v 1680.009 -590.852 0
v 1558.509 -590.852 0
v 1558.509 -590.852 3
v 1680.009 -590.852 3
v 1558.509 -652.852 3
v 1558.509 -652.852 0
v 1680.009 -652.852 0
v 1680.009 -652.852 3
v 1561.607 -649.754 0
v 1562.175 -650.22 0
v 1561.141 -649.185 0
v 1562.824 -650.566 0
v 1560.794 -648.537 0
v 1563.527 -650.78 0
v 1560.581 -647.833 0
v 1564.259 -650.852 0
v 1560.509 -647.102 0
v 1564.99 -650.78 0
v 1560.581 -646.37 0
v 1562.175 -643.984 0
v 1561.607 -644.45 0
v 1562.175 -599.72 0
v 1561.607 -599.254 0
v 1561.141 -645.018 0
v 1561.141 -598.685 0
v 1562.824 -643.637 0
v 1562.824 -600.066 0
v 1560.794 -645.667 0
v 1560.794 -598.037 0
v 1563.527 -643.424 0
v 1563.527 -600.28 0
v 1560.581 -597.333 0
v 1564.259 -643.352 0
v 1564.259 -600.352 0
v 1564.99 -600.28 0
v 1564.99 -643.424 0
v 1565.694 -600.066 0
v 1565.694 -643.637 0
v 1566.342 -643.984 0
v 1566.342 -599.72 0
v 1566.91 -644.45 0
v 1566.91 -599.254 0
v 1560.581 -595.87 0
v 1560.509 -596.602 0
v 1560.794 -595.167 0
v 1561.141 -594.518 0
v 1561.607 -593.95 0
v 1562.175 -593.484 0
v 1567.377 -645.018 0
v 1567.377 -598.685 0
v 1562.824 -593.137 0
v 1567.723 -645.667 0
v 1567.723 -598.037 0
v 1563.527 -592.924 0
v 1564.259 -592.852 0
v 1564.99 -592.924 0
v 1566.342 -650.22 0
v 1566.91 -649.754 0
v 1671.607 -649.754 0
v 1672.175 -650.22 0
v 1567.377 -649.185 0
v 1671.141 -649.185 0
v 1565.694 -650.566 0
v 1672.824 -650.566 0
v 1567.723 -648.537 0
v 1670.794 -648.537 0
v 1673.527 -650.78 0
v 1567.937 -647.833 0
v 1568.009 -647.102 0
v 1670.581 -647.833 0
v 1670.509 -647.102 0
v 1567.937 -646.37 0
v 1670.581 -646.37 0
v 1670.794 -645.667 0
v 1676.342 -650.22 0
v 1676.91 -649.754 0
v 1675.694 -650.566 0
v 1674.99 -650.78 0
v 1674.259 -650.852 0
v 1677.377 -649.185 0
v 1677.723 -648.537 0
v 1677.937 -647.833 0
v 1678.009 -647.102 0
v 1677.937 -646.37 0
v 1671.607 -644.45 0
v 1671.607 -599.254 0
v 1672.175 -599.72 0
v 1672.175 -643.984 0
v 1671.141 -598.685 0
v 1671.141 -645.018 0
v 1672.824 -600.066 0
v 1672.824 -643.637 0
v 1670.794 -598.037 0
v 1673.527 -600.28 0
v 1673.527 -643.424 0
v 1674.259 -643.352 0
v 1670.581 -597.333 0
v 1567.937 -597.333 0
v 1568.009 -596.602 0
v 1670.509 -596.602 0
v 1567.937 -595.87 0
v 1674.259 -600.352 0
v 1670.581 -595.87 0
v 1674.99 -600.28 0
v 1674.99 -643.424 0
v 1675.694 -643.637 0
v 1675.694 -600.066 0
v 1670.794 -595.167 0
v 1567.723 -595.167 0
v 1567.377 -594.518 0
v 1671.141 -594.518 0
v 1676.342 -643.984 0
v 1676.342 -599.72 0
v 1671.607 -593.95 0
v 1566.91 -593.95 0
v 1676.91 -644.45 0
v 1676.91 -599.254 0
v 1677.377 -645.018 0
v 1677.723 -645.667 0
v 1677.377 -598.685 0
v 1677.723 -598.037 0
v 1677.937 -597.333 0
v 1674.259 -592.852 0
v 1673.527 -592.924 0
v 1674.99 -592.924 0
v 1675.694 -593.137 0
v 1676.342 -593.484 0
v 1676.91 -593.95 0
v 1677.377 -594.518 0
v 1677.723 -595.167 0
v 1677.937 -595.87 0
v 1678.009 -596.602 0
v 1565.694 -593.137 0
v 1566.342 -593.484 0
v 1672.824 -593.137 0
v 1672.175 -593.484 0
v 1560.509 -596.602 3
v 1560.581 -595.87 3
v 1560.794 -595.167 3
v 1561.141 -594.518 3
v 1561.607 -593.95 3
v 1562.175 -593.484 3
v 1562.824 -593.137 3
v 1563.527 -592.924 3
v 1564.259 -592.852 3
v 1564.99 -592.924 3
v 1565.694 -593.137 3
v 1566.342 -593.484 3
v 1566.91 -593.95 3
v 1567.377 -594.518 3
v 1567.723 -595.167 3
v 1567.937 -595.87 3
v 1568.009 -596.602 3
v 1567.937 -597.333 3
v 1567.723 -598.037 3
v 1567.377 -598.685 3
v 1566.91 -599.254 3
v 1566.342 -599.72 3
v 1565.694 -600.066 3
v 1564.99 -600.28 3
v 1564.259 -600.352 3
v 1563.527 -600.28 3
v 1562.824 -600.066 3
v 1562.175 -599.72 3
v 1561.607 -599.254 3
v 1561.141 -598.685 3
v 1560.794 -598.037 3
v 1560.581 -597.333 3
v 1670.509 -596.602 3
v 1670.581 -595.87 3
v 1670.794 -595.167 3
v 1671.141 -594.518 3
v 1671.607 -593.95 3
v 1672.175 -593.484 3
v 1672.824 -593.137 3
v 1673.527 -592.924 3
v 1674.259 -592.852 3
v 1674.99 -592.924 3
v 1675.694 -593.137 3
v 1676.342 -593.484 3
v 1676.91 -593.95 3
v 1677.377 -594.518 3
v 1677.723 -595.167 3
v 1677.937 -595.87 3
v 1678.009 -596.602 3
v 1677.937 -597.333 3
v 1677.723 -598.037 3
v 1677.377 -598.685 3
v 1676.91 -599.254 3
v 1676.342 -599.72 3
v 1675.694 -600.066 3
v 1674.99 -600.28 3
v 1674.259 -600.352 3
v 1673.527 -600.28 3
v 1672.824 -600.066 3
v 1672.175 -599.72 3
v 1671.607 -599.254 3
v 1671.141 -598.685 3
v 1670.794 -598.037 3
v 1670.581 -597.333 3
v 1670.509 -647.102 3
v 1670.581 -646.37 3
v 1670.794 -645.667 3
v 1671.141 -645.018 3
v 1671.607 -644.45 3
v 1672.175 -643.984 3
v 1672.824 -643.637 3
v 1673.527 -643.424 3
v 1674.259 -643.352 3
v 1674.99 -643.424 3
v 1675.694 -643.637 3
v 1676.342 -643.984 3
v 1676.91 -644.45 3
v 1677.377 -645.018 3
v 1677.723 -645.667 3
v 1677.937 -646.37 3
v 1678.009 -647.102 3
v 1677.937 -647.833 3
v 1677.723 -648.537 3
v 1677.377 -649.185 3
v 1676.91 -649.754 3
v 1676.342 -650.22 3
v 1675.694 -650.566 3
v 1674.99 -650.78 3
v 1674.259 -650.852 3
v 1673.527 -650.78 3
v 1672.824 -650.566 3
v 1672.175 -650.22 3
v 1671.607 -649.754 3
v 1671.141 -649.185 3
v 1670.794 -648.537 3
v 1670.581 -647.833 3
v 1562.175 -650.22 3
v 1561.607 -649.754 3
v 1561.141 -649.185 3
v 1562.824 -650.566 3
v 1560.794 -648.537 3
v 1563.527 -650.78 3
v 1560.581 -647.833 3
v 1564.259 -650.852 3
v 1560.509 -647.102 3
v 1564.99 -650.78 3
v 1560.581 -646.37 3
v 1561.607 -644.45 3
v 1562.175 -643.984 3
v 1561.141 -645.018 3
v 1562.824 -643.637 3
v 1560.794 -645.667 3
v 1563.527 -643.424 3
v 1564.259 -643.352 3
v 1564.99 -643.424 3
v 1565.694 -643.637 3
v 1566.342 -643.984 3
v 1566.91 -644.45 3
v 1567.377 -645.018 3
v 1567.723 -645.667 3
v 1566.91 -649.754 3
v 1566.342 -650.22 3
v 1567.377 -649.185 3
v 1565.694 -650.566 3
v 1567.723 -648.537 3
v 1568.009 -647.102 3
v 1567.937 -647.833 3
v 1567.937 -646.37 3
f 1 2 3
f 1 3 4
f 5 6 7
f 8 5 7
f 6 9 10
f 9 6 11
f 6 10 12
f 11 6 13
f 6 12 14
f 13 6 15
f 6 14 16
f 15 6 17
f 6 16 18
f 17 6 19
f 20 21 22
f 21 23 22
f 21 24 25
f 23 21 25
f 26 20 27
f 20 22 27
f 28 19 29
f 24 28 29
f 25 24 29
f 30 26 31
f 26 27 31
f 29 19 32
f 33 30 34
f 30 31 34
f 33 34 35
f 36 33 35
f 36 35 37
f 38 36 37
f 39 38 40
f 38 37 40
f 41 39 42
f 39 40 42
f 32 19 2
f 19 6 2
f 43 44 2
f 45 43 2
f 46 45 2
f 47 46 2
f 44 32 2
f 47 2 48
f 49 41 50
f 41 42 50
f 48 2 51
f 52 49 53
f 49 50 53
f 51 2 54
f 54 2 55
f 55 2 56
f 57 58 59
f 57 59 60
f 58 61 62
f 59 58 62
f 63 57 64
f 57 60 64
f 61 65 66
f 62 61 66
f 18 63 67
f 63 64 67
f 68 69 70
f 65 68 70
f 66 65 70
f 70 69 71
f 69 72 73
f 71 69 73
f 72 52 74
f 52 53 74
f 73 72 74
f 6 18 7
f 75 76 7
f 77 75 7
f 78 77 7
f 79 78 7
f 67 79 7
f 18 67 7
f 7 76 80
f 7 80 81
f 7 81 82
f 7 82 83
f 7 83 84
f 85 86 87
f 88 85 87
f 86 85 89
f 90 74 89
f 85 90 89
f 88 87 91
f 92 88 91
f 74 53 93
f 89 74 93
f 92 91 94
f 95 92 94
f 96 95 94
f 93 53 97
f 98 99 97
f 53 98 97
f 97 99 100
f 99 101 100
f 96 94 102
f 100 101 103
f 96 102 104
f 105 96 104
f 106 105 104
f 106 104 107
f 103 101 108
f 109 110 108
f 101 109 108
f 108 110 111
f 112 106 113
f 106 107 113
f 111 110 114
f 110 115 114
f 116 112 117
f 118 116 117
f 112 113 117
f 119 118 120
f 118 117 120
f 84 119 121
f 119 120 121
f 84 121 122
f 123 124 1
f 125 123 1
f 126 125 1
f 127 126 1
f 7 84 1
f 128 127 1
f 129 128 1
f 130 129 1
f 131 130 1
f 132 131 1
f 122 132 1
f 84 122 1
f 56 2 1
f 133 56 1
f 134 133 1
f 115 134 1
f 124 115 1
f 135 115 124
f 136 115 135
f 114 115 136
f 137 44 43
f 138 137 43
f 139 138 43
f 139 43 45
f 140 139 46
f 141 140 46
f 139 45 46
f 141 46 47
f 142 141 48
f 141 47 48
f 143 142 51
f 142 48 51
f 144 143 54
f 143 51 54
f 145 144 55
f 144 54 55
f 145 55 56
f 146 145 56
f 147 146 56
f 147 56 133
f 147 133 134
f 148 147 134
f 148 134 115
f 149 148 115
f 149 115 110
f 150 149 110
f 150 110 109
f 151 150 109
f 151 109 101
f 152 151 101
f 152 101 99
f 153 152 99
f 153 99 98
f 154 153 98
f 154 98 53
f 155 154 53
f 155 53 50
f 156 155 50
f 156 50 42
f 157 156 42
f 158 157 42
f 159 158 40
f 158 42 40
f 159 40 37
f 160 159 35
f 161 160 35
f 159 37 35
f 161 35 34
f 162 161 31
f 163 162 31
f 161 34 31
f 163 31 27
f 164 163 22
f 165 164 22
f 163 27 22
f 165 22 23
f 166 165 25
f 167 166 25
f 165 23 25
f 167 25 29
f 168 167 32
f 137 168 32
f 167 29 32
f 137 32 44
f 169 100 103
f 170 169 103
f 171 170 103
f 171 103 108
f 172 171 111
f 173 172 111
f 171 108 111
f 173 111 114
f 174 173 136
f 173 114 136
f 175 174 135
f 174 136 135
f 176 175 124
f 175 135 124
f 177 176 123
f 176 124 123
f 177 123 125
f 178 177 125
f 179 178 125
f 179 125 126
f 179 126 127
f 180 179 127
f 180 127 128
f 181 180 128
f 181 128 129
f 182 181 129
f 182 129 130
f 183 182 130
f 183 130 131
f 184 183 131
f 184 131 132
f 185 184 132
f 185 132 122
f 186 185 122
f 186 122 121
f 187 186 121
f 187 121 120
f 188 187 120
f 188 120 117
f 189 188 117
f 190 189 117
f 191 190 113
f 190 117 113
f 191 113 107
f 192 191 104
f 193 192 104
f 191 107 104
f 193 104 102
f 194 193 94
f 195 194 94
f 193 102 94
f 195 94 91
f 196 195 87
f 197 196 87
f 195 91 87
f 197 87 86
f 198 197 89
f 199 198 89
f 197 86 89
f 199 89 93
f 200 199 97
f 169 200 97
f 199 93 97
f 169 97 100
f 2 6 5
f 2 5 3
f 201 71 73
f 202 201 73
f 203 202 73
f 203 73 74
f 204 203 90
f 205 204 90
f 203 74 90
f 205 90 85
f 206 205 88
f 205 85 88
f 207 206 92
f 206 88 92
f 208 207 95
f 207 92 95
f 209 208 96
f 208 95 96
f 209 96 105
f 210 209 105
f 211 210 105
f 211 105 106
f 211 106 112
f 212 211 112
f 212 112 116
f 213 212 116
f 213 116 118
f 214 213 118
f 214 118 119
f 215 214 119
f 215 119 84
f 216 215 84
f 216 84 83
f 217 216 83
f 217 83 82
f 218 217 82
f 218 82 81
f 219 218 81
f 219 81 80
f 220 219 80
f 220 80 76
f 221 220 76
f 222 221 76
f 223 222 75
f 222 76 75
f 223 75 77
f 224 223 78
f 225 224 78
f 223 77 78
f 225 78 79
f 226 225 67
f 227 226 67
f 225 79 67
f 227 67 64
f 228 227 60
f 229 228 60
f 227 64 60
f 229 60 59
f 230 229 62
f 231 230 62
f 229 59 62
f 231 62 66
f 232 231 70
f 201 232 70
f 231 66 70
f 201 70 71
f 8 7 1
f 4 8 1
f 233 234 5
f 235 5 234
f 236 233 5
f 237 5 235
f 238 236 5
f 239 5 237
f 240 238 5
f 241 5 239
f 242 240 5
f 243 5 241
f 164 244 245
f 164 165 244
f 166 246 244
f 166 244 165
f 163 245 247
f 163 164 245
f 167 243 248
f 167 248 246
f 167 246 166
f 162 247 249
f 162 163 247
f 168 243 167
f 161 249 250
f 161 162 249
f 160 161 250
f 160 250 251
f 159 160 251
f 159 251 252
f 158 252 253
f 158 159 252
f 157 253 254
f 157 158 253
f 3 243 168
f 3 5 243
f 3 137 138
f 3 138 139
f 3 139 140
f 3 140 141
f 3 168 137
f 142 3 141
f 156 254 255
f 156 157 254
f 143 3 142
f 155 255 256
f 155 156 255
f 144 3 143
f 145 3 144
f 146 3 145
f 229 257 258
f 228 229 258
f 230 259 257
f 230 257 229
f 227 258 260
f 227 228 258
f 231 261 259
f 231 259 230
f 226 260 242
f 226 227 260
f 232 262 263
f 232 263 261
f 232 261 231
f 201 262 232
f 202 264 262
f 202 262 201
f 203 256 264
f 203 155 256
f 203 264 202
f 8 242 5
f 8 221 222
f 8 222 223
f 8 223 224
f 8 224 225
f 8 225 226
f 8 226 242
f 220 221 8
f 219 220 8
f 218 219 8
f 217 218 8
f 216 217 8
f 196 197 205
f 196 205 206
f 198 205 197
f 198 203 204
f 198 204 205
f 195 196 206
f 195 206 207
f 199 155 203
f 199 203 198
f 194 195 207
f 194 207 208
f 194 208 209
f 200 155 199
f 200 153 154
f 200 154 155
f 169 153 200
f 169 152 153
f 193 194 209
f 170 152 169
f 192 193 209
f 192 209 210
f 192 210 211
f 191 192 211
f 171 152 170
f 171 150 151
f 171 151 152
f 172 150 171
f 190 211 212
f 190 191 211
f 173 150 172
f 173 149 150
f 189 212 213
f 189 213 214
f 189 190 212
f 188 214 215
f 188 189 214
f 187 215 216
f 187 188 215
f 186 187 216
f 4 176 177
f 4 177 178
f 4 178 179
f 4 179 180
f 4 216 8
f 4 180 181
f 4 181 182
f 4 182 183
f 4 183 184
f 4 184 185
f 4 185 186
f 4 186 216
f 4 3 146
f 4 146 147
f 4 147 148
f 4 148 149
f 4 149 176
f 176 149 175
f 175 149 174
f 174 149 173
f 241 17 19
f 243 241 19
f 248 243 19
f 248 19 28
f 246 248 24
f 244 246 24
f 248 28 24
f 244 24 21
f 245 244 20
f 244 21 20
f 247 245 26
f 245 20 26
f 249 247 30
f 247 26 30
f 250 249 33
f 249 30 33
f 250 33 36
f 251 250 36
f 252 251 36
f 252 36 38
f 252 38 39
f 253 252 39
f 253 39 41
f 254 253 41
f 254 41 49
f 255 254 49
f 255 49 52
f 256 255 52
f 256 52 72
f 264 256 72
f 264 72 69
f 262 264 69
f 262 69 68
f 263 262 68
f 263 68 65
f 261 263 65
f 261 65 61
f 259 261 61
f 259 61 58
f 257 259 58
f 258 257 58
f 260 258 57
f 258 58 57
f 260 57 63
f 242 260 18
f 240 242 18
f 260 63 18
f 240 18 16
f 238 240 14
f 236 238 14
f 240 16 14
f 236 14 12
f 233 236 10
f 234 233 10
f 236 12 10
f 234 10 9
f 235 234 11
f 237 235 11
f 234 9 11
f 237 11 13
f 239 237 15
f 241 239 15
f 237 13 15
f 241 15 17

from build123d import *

# Parameters (mm, degrees)
F0_W     = 121.5
F0_H     = 62
F1_DEPTH = 3
F3_D     = 7.5
F5_D     = 7.5
F7_D     = 7.5


with BuildPart() as f1:
    # F0 (on Top) → F1 (new body)
    with BuildSketch(Plane.XY):
        with Locations((1619.258806, -621.851886)):
            Rectangle(F0_W, F0_H)
    extrude(amount=F1_DEPTH)

    # F3 (through all)
    with Locations(Plane.XY.offset(3)):
        with Locations((1564.258806, -647.101886)):
            Hole(F3_D / 2)

    # F5 (through all)
    with Locations(Plane.XY.offset(3)):
        with Locations((1564.258806, -596.601886)):
            Hole(F5_D / 2)

    # F7 (through all)
    with Locations(Plane.XY.offset(3)):
        with Locations((1674.258806, -596.601886), (1674.258806, -647.101886)):
            Hole(F7_D / 2)


solid = f1.part
